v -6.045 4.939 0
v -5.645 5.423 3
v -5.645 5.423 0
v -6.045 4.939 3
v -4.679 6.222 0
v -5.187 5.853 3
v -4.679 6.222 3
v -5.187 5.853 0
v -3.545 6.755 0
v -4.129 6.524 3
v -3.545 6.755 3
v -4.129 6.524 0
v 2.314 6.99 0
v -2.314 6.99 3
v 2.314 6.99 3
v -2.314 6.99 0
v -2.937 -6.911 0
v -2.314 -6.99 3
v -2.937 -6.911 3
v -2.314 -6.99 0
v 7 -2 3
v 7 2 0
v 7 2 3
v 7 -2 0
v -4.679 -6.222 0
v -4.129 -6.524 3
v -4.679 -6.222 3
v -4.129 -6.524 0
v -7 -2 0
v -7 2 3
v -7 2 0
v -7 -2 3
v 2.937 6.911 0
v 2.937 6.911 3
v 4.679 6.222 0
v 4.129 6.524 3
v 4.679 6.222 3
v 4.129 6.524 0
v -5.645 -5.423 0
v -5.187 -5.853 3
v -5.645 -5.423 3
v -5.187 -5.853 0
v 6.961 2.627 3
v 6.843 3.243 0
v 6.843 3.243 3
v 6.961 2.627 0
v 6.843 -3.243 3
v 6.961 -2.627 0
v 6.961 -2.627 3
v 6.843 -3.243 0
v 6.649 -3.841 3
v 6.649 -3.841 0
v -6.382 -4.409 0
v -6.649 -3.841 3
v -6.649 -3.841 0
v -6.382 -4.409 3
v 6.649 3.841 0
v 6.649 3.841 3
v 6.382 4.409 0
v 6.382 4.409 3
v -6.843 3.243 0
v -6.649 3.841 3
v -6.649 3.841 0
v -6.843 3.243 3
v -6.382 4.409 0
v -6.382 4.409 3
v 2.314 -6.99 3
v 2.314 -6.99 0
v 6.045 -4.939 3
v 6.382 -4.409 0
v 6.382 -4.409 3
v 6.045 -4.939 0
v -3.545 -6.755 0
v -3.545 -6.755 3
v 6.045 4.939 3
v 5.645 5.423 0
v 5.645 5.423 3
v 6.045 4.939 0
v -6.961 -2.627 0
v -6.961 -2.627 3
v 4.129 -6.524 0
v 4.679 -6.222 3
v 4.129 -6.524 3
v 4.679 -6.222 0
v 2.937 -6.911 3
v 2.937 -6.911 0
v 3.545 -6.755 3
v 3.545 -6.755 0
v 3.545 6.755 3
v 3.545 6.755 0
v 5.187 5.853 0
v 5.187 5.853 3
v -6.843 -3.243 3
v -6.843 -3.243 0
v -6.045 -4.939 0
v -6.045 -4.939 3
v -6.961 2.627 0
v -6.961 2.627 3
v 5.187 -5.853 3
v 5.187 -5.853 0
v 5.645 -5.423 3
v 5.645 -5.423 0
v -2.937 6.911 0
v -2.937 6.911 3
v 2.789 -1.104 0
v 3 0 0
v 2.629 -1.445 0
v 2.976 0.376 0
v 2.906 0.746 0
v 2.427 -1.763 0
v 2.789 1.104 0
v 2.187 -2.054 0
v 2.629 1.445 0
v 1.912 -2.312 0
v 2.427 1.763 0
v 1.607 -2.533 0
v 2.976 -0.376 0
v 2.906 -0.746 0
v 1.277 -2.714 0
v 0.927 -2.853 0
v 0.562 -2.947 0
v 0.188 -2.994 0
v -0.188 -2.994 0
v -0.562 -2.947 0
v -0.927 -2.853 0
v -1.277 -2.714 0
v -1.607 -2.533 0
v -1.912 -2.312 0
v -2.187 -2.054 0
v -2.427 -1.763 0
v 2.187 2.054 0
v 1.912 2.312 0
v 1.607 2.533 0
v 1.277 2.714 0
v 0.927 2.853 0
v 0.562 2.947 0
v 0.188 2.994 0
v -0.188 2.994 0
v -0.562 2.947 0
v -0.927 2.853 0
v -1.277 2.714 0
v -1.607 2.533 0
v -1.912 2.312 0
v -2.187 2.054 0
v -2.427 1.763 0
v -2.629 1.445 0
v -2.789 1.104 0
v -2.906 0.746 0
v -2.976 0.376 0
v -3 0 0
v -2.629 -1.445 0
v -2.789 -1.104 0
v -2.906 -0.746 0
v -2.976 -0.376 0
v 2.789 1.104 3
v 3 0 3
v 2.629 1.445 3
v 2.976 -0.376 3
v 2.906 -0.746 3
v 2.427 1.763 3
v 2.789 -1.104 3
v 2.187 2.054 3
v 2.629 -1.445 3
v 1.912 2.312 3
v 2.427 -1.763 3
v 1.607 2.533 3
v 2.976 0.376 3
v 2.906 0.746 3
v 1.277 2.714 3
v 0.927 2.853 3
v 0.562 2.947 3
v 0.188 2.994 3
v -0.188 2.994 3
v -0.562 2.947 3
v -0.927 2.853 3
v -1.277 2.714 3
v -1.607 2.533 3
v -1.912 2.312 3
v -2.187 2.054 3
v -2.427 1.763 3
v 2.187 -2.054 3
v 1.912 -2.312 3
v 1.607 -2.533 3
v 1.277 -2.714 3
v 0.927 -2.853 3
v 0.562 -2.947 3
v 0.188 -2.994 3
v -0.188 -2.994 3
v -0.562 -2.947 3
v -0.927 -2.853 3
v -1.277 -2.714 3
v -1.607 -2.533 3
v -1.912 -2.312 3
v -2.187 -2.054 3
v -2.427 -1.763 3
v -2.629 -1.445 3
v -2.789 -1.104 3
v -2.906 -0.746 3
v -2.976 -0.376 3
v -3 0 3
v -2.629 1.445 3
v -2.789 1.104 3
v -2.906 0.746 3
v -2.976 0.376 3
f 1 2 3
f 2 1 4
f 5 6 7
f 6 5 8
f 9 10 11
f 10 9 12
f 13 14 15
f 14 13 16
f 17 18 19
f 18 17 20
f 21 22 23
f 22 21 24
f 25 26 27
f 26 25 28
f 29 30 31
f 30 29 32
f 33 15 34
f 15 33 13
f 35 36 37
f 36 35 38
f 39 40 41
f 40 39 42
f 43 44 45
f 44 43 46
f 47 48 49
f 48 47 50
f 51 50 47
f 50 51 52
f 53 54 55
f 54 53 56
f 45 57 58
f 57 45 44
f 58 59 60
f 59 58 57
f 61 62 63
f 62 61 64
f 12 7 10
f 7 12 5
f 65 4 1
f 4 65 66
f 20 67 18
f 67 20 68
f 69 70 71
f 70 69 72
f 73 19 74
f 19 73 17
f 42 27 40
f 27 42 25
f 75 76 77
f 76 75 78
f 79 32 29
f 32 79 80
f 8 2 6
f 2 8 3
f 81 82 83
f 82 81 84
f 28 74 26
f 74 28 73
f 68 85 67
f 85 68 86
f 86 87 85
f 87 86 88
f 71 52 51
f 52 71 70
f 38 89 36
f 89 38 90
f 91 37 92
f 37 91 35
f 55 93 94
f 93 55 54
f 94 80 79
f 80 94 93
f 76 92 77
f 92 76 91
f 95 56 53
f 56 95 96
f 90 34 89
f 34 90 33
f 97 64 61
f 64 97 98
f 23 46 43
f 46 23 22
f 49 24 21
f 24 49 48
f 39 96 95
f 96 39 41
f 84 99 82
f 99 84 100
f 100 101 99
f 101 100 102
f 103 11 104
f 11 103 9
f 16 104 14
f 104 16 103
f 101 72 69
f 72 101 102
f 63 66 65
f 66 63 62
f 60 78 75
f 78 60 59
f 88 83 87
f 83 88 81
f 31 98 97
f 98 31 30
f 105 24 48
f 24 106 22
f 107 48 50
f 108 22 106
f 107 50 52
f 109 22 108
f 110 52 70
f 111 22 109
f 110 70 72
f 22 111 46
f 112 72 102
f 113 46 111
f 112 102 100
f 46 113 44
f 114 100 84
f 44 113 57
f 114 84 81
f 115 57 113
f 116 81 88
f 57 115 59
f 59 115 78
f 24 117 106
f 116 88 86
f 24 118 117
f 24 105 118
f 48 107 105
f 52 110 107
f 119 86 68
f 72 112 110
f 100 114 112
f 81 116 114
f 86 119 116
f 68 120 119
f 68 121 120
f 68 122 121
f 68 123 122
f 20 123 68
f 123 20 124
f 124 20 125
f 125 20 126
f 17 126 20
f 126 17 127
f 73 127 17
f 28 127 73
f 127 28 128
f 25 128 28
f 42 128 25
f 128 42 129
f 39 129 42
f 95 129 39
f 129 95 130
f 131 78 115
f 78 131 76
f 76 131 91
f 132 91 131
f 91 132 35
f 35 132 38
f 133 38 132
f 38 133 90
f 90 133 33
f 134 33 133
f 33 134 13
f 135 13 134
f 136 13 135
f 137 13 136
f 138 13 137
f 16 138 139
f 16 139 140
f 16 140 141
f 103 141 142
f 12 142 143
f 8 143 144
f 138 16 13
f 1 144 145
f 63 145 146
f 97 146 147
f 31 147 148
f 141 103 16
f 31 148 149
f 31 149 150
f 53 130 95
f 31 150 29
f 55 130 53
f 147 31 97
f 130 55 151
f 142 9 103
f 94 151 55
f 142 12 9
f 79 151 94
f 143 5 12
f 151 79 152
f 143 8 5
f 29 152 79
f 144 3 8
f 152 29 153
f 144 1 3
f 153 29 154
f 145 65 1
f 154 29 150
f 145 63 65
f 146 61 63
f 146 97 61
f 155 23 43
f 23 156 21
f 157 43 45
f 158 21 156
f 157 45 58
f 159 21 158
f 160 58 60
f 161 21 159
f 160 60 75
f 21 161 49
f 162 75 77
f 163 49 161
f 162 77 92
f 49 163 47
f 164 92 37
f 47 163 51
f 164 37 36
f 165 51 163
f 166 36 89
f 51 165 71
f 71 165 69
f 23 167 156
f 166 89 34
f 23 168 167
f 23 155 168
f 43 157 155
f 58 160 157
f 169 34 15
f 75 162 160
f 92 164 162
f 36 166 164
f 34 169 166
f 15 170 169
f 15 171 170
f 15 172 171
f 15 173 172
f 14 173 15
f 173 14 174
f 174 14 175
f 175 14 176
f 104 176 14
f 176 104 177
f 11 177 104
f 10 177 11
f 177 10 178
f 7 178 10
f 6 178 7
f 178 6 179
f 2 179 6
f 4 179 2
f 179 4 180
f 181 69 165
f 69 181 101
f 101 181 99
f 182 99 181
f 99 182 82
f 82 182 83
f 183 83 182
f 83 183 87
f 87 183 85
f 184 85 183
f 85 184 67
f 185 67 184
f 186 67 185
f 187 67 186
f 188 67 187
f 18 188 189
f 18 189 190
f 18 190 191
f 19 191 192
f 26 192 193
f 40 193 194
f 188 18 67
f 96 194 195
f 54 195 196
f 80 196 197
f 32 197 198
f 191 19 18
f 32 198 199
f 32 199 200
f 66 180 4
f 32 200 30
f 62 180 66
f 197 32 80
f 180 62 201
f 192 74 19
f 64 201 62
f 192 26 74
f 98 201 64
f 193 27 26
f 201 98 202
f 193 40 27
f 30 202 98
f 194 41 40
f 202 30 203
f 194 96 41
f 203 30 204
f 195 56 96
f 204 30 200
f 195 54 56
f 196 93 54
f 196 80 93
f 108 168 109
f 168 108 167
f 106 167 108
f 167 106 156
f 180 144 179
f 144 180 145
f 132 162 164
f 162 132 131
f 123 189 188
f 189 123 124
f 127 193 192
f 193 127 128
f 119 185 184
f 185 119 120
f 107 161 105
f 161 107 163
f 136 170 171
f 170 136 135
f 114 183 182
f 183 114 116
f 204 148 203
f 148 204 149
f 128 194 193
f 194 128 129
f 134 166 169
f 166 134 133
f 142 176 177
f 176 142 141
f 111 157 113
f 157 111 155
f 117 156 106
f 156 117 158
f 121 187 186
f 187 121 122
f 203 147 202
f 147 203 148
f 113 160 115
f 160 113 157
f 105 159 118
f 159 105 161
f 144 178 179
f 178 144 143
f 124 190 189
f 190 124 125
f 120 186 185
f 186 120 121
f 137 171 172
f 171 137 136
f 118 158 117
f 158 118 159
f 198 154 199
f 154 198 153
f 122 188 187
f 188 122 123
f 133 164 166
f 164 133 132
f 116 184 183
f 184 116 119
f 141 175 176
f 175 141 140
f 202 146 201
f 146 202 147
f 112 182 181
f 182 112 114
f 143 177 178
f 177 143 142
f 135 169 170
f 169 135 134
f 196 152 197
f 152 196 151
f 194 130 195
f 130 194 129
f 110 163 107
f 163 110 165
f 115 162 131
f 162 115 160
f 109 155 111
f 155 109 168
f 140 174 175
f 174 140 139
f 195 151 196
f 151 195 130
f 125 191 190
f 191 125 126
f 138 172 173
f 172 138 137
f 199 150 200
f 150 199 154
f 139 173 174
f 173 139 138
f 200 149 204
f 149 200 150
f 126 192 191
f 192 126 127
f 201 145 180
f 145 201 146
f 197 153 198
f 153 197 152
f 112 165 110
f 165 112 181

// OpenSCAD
// Generated by SolidPython 1.1.3 on 2023-03-12 21:50:19
$fn = 50;


difference() {
	union() {
		translate(v = [0, 0, 0]) {
			rotate(a = [0, 0, 0]) {
				hull() {
					translate(v = [-2.0000000000, 2.0000000000, 0]) {
						rotate(a = [0, 0, 0]) {
							translate(v = [0, 0, 0]) {
								rotate(a = [0, 0, 0]) {
									cylinder(h = 3, r = 5);
								}
							}
						}
					}
					translate(v = [2.0000000000, 2.0000000000, 0]) {
						rotate(a = [0, 0, 0]) {
							translate(v = [0, 0, 0]) {
								rotate(a = [0, 0, 0]) {
									cylinder(h = 3, r = 5);
								}
							}
						}
					}
					translate(v = [-2.0000000000, -2.0000000000, 0]) {
						rotate(a = [0, 0, 0]) {
							translate(v = [0, 0, 0]) {
								rotate(a = [0, 0, 0]) {
									cylinder(h = 3, r = 5);
								}
							}
						}
					}
					translate(v = [2.0000000000, -2.0000000000, 0]) {
						rotate(a = [0, 0, 0]) {
							translate(v = [0, 0, 0]) {
								rotate(a = [0, 0, 0]) {
									cylinder(h = 3, r = 5);
								}
							}
						}
					}
				}
			}
		}
	}
	union() {
		translate(v = [0.0000000000, 0.0000000000, 0]) {
			rotate(a = [0, 0, 0]) {
				translate(v = [0, 0, -50]) {
					rotate(a = [0, 0, 0]) {
						cylinder(h = 100, r = 3.0000000000);
					}
				}
			}
		}
	}
}
/***********************************************
*********      SolidPython code:      **********
************************************************
 
from solid import *
import os
import subprocess

import oomB

import opsc_library_gen

mode = "laser"
#mode = "3d_print"

defined_objects = {}

radius_dict = {}
countersunk_dict = {}


def set_mode(m):
    global mode
    mode = m
    radius_dict['M6'] = 6.5/2
    radius_dict['M3'] = 3.3/2
    if mode == "laser":
        radius_dict['M6'] = 6/2
        radius_dict['M3'] = 3/2

    countersunk_dict['M3'] = {}
    countersunk_dict['M3']['little_rad'] = radius_dict['M3']
    countersunk_dict['M3']['big_rad'] = (5.5+0.6)/2
    if mode == "laser":
        countersunk_dict['M3']['big_rad'] = (4.75+0.6)/2
        countersunk_dict['M3']['little_rad'] = (4.75+0.6)/2

    countersunk_dict['M3']['height'] = 1.7


def opsc_make_object(filename, objects, save_type="none",resolution=50, layers = 1, tilediff = 200, mode="laser", overwrite=True):
    if overwrite or not os.path.exists(filename):
        set_mode(mode)
        save_type = save_type.lower()
        os.makedirs(os.path.dirname(filename), exist_ok=True)
        final_object = opsc_get_object(objects, mode = mode)
        # Save the final object to the specified filename    
        scad_render_to_file(final_object, filename, file_header='$fn = %s;' % resolution, include_orig_code=True)
        if mode == "laser":
            filename_laser = filename.replace(".scad","-flat.scad")
            scad_render_to_file(getLaser(final_object, layers=layers, tilediff=tilediff), filename_laser, file_header='$fn = %s;' % resolution, include_orig_code=True)
            if save_type == "all":
                saveToAll(filename_laser)
            elif save_type == "dxf":
                saveToDxf(filename_laser)
        if save_type == "all":
            saveToAll(filename)
        elif save_type == "dxf":
            saveToDxf(filename)


def opsc_get_object(objects, mode = "laser"):
    # Create the solidpython objects only include the positive objects and if they don't have inclusion or their inclusion is either all or mode
    # Initialize an empty list to store the results
    positive_objects = []

    # Iterate over the "objects" list
    for obj in objects:
        # Check if the current object has a "type" key with a value of "positive"
        if obj['type'] == 'positive':
            # Check if the current object has an "inclusion" key and its value matches "mode",
            # or if the current object does not have an "inclusion" key at all
            if not 'inclusion' in obj or obj['inclusion'] == "all" or obj['inclusion'] == mode:
                # Call the "get_opsc_item" function with the current object as an argument
                opsc_item = get_opsc_item(obj)
                # Add the result to the "positive_objects" list
                positive_objects.append(opsc_item)
# Initialize an empty list to store the results
    negative_objects = []

    # Iterate over the "objects" list
    for obj in objects:
        # Check if the current object has a "type" key with a value of "negative"
        if obj['type'] == 'negative':
            # Check if the current object has an "inclusion" key and its value matches "mode",
            # or if the current object does not have an "inclusion" key at all
            if not 'inclusion' in obj or obj['inclusion'] == "all" or obj['inclusion'] == mode:
                # Call the "get_opsc_item" function with the current object as an argument
                opsc_item = get_opsc_item(obj)
                # Add the result to the "negative_objects" list
                negative_objects.append(opsc_item)
    
    #positive_objects = [get_opsc_item(obj) for obj in objects if obj['type'] == 'positive']
    #negative_objects = [get_opsc_item(obj) for obj in objects if obj['type'] == 'negative']
    # Union the positive objects
    positive_object = union()(*positive_objects)
    # Union the negative objects
    negative_object = union()(*negative_objects)
    # Create the final object by subtracting the negative objects from the positive objects
    return difference()(positive_object, negative_object)

def get_opsc_item(params):
    # A dictionary to map radius string values to numerical values
    #radius_dict = {'small': 5, 'medium': 10, 'large': 15}
    # An array of function names for basic shapes
    basic_shapes = ['cube', 'sphere', 'cylinder']
    
    # An array of function names for other shapes
    other_shapes = ['hole', 'slot', 'rounded_rectangle', 'countersunk']
    


    # Convert radius to r if present, and remove radius from the params dictionary
    if 'radius' in params:
        if isinstance(params['radius'], str):
            # Use the radius_dict to map the radius string value to a numerical value
            params['r'] = radius_dict[params['radius']]
        else:
            params['r'] = params['radius']
        del params['radius']
    

    # Check if the object type is a basic shape
    if params['shape'] in basic_shapes:
        # Remove shape and unexpected dictionary values
        allowed_keys = {'size', 'r', 'r1', 'r2', 'd', 'h', 'rw', 'rh', 'dw', 'dh'}
        shape_params = {k: v for k, v in params.items() if k in allowed_keys}

        # Call the corresponding function for the shape parameter, using ** notation to pass the shape_params dictionary as keyword arguments
        return get_opsc_transform(params,globals()[params['shape']](**shape_params))
    
    # If the object type is not a basic shape, check if it's a defined object or one of the other shapes
    elif params['shape'] in other_shapes:
        # Call the corresponding function for the shape parameter, passing the params dictionary as an argument
        p2 = copy.deepcopy(params)
        p2["pos"] = [0,0,0]
        return get_opsc_transform(params,globals()[params['shape']](p2))
    
    # If the object is not a basic shape or a defined object, try to import it from a .scad file
    else:
        obj = defined_objects[params['shape']]
        return get_opsc_transform(params,obj)

def get_opsc_transform(params, solid_obj):
    # Rotate the object based on the 'rot' field in the params dictionary, or the 'rotX', 'rotY', and 'rotZ' fields if 'rot' is not present
    rot = params.get('rot', [])
    if rot:
        rotX, rotY, rotZ = rot
    else:
        rotX = params.get('rotX', 0)
        rotY = params.get('rotY', 0)
        rotZ = params.get('rotZ', 0)
    solid_obj = rotate([rotX, rotY, rotZ])(solid_obj)

    # Translate the object based on the 'pos' field in the params dictionary, or the 'x', 'y', and 'z' fields if 'pos' is not present
    pos = params.get('pos', [])
    if pos:
        x, y, z = pos
    else:
        x = params.get('x', 0)
        y = params.get('y', 0)
        z = params.get('z', 0)
    solid_obj = translate([x, y, z])(solid_obj)
    return solid_obj


import random

def opsc_easy_array(type, shape, repeats, pos_start, shift_arr, **kwargs):
    for i in range(0,3):
        repeats.append(1)
        pos_start.append(0)
        shift_arr.append(0)
    return_objects = []

    for x in range(0,repeats[0]):
        for y in range(0,repeats[1]):
            for z in range(0,repeats[2]):
                return_objects.append(opsc_easy(type, shape, pos=[pos_start[0]+x*shift_arr[0],pos_start[1]+y*shift_arr[1],pos_start[2]+z*shift_arr[2]], **kwargs))
    return return_objects                



def opsc_easy(type, shape, **kwargs):
    obj = {
        'type': type,
        'shape': shape
    }
    for param in ['size', 'r', 'r1', 'r2', 'd', 'h', 'rw', 'rh', 'dw', 'dh', 'pos', 'x', 'y', 'z', 'rot', 'rotX', 'rotY', 'rotZ', "w", "inclusion"]:
        if param in kwargs:
            obj[param] = kwargs[param]
    return obj

def hole(params):
    p2 = copy.deepcopy(params)  
    # Check if the radius is a string and replace it with the corresponding value from the dictionary
    if isinstance(p2['r'], str):
        p2['r'] = radius_dict[p2['r']]
    
    # Set the height to 100 if not specified
    if 'h' not in p2:
        p2['h'] = 100
        p2["pos"] = [0,0,-50]
    p2["center"] = True
    # Create the cylinder object
    p2["shape"] = "cylinder"
    p2["type"] = "positive"

    return get_opsc_item(p2)

import copy

def countersunk(params):
    p2 = copy.deepcopy(params)
    counter_rad = p2['r']
    p2['r'] = radius_dict[p2['r']]
    hp = copy.deepcopy(p2)
    hp["type"] = "positive"
    hp["shape"] = "hole"
    del hp["rot"]
    hol = get_opsc_item(hp)
    
    cp = copy.deepcopy(p2)
    cp["h"] = countersunk_dict[counter_rad]["height"]
    cp["r2"] = countersunk_dict[counter_rad]["little_rad"]
    cp["r1"] = countersunk_dict[counter_rad]["big_rad"]
    del cp["r"]
    del cp["rot"]
    cp["type"] = "positive"
    cp["shape"] = "cylinder"
    cp["pos"] = [0,0,0]

    top = get_opsc_item(cp)
    return union()(hol,top)



def slot(params):  
    p2 = copy.deepcopy(params) 
    if isinstance(p2['r'], str):
        p2['r'] = radius_dict[p2['r']]
    p2["type"] = "positive"
    p2["shape"] = "hole"
    del p2["rot"]
    p2["pos"] = [0,0,0]
    left = copy.deepcopy(p2)
    right = copy.deepcopy(p2)
    left["pos"][0] = p2["w"] / 2 - p2["r"] 
    
    right["pos"][0] = -p2["w"] / 2 + p2["r"] 
    pass
    leftObj = get_opsc_item(left)
    rightObj = get_opsc_item(right)
    return hull()(leftObj, rightObj)

def rounded_rectangle(params):   
    p2 = copy.deepcopy(params) 
    p2["h"] = p2["size"][2]
    p2["pos"] = p2.get("pos", [0, 0, 0]) 
    p2["type"] = "positive"
    p2["shape"] = "hole"
    p2["pos"] = [0,0,0]
    
    if 'rot' in p2:
        del p2["rot"]   
    if 'r' not in p2:
        p2["r"] = 5 
    tl = copy.deepcopy(p2)
    tr = copy.deepcopy(p2)
    bl = copy.deepcopy(p2)
    br = copy.deepcopy(p2)
    tl["pos"][0] = -(p2["size"][0] - p2["r"]*2)/2
    tl["pos"][1] = (p2["size"][1] - p2["r"]*2)/2
    tr["pos"][0] = (p2["size"][0] - p2["r"]*2)/2
    tr["pos"][1] = (p2["size"][1] - p2["r"]*2)/2
    bl["pos"][0] = -(p2["size"][0] - p2["r"]*2)/2
    bl["pos"][1] = -(p2["size"][1] - p2["r"]*2)/2
    br["pos"][0] = (p2["size"][0] - p2["r"]*2)/2
    br["pos"][1] = -(p2["size"][1] - p2["r"]*2)/2
    del tl["size"]
    del tr["size"]
    del bl["size"]
    del br["size"]
    tlo = get_opsc_item(tl)
    tro = get_opsc_item(tr)
    blo = get_opsc_item(bl)
    bro = get_opsc_item(br)    
    return hull()(tlo, tro, blo, bro)



def import_scad_object(filename):
    # Import the .scad file and convert it to a solidpython object
    #filename = "parts"
    obj = import_scad(filename)
    return obj.main()
    


import os
import solid as solidpython

# A dictionary to store the defined objects


def load_scad_objects():
    opsc_library_gen.gen_library(defined_objects)

import random

def test(num_objects):
    objects = []
    for i in range(num_objects):
        # Choose a random shape
        #shape = random.choice(['cube', 'sphere', 'cylinder', 'hole', 'slot', "rounded_rectangle"])
        shape = random.choice(["rounded_rectangle"])

        # Choose a random type
        type = random.choice(['positive', 'negative'])
        
        # Create an empty object dictionary
        obj = {'shape': shape, 'type': type}
        
        # Set shape-specific parameters
        if obj['shape'] in ['cube']:
            obj['size'] =  [random.uniform(5, 15), random.uniform(5, 15), random.uniform(5, 15)]
        if obj['shape'] in ['rounded_rectangle']:
            obj['size'] =  [random.uniform(5, 15), random.uniform(5, 15), random.uniform(5, 15)]
            obj['r'] = random.uniform(0.5, 5)
        elif obj['shape'] == 'sphere':
            obj['r'] = random.uniform(5, 15)
        elif obj['shape'] in ['cylinder', 'hole']:
            obj['r'] = random.uniform(0.5, 5)
            obj['h'] = random.uniform(5, 15)
        elif obj['shape'] == 'slot':
            obj['r'] = random.uniform(0.5, 5)
            obj['h'] = random.uniform(5, 15)
            obj['w'] = random.uniform(5, 15)
        
        # Set a random position and rotation
        obj['pos'] = [random.uniform(-20, 20), random.uniform(-20, 20), random.uniform(-20, 20)]
        obj['rot'] = [random.uniform(-180, 180), random.uniform(-180, 180), random.uniform(-180, 180)]
        
        # Add the object to the list
        objects.append(obj)
    return objects

####### old file saving
def saveToAll(fileIn):
    saveToDxf(fileIn)
    saveToPng(fileIn)
    saveToStl(fileIn)
    saveToSvg(fileIn)

def saveToDxf(fileIn, fileOut="", copy_to_laser=True):
    if fileOut == "":
        fileOut = fileIn.replace(".scad",".dxf")
    saveToFile(fileIn, fileOut)


    
def saveToPng(fileIn, fileOut="",extra="--render"):
    if fileOut == "":
        fileOut = fileIn.replace(".scad",".png")
    saveToFile(fileIn, fileOut)

def saveToStl(fileIn, fileOut=""):
    if fileOut == "":
        fileOut = fileIn.replace(".scad",".stl")
    saveToFile(fileIn, fileOut)
    
def saveToSvg(fileIn, fileOut=""):
    if fileOut == "":
        fileOut = fileIn.replace(".scad",".svg")
    saveToFile(fileIn, fileOut)

def saveToFile(fileIn, fileOut,extra=""):
    #extra = extra + " --colorscheme Tomorrow"

    launchStr = 'openscad -o "' + fileOut + '"' + extra + ' "' + fileIn + '"'
    if ".png" in fileOut:
        launchStr = launchStr + " --render"
    print("            saveToFile launch string: " + launchStr)
    subprocess.run(launchStr)
    x=0

def getLaser(final_object,start=1.5,layers=1,thickness=3,tilediff=200):
        rv= []

        for x in range(layers):
            rv.append(translate([0,x*tilediff,0])(
                    projection()(
                        intersection()(translate([-500,-500,start+x*thickness])(cube(size=[1000,1000,0.1])),
                            final_object
                        )
                    )
            )
            )
            
        return union()(rv)

set_mode("laser")
load_scad_objects() 
 
************************************************/
